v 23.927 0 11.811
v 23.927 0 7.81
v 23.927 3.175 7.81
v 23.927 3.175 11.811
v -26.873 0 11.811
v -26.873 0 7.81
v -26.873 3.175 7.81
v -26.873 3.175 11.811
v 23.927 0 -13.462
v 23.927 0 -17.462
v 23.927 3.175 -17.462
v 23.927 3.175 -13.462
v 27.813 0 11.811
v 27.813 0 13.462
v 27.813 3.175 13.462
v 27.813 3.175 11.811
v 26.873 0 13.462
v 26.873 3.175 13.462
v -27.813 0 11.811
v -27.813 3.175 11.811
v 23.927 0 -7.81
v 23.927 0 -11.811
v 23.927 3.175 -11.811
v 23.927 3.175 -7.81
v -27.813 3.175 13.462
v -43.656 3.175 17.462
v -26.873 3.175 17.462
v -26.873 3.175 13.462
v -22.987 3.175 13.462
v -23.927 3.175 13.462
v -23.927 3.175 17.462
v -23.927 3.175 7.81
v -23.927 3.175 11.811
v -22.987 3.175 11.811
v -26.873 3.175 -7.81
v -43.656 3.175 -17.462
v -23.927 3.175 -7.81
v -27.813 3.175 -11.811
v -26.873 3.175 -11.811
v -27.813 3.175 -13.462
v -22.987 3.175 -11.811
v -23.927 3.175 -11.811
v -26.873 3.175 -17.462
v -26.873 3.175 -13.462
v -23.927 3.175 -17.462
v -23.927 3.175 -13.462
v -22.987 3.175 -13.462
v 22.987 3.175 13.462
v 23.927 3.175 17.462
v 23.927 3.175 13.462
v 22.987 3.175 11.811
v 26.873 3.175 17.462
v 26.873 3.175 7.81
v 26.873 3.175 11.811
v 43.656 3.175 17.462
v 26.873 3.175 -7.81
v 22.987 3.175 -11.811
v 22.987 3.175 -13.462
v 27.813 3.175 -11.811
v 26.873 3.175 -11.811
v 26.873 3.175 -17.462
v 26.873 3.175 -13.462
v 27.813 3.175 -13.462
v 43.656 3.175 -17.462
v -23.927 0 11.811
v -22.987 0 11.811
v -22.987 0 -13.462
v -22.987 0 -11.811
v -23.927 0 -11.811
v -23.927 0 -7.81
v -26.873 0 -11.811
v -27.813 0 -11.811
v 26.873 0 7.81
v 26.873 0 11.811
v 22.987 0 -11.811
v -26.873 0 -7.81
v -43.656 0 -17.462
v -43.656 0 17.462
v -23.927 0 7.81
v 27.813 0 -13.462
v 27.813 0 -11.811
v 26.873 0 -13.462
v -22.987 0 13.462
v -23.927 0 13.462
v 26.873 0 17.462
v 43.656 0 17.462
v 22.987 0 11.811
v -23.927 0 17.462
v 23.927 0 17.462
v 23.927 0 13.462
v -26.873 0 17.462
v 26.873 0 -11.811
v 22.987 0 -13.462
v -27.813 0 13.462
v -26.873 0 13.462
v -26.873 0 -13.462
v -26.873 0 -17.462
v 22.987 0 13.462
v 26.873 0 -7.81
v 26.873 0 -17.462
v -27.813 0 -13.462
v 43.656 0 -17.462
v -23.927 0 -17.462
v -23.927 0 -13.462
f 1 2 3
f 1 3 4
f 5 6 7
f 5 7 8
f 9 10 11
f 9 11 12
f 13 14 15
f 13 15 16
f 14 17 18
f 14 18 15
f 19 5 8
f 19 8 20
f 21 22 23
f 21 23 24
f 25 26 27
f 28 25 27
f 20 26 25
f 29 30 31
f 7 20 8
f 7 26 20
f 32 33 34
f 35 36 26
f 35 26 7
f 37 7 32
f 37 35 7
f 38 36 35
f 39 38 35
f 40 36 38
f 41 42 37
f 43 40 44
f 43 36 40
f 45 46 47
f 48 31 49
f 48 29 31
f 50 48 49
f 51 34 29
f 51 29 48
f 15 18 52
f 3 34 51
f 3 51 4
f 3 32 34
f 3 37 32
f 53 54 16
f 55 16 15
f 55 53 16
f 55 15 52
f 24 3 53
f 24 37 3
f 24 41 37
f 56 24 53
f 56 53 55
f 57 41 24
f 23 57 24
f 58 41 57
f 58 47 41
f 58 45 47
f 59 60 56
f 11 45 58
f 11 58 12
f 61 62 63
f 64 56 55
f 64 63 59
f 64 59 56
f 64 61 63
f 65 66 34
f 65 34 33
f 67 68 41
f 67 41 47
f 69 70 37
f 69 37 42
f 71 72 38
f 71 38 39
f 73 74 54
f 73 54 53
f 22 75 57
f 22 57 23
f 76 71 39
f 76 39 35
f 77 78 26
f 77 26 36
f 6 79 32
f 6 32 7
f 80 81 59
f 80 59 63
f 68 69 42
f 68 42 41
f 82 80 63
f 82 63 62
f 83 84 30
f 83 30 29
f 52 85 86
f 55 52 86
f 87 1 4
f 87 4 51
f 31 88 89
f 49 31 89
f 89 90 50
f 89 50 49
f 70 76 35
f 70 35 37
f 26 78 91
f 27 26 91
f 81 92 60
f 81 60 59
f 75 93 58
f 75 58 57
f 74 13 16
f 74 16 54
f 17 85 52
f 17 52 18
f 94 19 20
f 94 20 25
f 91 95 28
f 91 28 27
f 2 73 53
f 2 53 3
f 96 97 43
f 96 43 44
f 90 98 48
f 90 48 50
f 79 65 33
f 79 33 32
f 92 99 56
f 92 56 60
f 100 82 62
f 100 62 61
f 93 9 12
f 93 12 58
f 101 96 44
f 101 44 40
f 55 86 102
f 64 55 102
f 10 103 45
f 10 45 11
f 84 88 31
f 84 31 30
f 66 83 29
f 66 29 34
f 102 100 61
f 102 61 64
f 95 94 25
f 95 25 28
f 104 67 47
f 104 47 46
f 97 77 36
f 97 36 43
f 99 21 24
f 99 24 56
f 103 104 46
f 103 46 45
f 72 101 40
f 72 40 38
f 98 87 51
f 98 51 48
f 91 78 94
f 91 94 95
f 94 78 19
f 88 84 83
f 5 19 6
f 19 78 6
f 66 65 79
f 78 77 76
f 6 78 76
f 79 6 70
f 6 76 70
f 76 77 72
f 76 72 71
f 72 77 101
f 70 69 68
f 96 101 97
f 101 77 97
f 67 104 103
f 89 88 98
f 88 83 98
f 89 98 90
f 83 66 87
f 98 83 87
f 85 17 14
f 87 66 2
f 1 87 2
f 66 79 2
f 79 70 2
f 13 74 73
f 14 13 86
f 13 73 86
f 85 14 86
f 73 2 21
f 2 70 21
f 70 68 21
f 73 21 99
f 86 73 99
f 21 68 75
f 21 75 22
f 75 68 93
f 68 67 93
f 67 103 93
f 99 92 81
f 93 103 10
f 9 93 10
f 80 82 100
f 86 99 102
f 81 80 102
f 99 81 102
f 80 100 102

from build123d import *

# Parameters (mm, degrees)
SKETCH1_W           = 87.3125
SKETCH1_H           = 34.925
BOSS_EXTRUDE1_DEPTH = 3.175
CUT_EXTRUDE2_DEPTH  = 48.126295158


with BuildPart() as part:
    # Sketch1 → Boss-Extrude1 (new body)
    with BuildSketch(Plane(origin=(0, 0, 0), x_dir=(1, 0, 0), z_dir=(0, 1, 0))):
        Rectangle(SKETCH1_W, SKETCH1_H)
    extrude(amount=BOSS_EXTRUDE1_DEPTH)

    # Sketch3 → Cut-Extrude2 (cut, through all)
    with BuildSketch(Plane.XZ):
        Polygon((-26.8732, 17.4625), (-23.9268, 17.4625), (-23.9268, 13.462), (-22.987, 13.462), (-22.987, 11.811), (-23.9268, 11.811), (-23.9268, 7.8105), (-26.8732, 7.8105), (-26.8732, 11.811), (-27.813, 11.811), (-27.813, 13.462), (-26.8732, 13.462), align=None)
        Polygon((26.8732, 11.811), (26.8732, 7.8105), (23.9268, 7.8105), (23.9268, 11.811), (22.987, 11.811), (22.987, 13.462), (23.9268, 13.462), (23.9268, 17.4625), (26.8732, 17.4625), (26.8732, 13.462), (27.813, 13.462), (27.813, 11.811), align=None)
        Polygon((26.8732, -17.4625), (23.9268, -17.4625), (23.9268, -13.462), (22.987, -13.462), (22.987, -11.811), (23.9268, -11.811), (23.9268, -7.8105), (26.8732, -7.8105), (26.8732, -11.811), (27.813, -11.811), (27.813, -13.462), (26.8732, -13.462), align=None)
        Polygon((-26.8732, -11.811), (-26.8732, -7.8105), (-23.9268, -7.8105), (-23.9268, -11.811), (-22.987, -11.811), (-22.987, -13.462), (-23.9268, -13.462), (-23.9268, -17.4625), (-26.8732, -17.4625), (-26.8732, -13.462), (-27.813, -13.462), (-27.813, -11.811), align=None)
    extrude(amount=-CUT_EXTRUDE2_DEPTH, mode=Mode.SUBTRACT)


solid = part.part
